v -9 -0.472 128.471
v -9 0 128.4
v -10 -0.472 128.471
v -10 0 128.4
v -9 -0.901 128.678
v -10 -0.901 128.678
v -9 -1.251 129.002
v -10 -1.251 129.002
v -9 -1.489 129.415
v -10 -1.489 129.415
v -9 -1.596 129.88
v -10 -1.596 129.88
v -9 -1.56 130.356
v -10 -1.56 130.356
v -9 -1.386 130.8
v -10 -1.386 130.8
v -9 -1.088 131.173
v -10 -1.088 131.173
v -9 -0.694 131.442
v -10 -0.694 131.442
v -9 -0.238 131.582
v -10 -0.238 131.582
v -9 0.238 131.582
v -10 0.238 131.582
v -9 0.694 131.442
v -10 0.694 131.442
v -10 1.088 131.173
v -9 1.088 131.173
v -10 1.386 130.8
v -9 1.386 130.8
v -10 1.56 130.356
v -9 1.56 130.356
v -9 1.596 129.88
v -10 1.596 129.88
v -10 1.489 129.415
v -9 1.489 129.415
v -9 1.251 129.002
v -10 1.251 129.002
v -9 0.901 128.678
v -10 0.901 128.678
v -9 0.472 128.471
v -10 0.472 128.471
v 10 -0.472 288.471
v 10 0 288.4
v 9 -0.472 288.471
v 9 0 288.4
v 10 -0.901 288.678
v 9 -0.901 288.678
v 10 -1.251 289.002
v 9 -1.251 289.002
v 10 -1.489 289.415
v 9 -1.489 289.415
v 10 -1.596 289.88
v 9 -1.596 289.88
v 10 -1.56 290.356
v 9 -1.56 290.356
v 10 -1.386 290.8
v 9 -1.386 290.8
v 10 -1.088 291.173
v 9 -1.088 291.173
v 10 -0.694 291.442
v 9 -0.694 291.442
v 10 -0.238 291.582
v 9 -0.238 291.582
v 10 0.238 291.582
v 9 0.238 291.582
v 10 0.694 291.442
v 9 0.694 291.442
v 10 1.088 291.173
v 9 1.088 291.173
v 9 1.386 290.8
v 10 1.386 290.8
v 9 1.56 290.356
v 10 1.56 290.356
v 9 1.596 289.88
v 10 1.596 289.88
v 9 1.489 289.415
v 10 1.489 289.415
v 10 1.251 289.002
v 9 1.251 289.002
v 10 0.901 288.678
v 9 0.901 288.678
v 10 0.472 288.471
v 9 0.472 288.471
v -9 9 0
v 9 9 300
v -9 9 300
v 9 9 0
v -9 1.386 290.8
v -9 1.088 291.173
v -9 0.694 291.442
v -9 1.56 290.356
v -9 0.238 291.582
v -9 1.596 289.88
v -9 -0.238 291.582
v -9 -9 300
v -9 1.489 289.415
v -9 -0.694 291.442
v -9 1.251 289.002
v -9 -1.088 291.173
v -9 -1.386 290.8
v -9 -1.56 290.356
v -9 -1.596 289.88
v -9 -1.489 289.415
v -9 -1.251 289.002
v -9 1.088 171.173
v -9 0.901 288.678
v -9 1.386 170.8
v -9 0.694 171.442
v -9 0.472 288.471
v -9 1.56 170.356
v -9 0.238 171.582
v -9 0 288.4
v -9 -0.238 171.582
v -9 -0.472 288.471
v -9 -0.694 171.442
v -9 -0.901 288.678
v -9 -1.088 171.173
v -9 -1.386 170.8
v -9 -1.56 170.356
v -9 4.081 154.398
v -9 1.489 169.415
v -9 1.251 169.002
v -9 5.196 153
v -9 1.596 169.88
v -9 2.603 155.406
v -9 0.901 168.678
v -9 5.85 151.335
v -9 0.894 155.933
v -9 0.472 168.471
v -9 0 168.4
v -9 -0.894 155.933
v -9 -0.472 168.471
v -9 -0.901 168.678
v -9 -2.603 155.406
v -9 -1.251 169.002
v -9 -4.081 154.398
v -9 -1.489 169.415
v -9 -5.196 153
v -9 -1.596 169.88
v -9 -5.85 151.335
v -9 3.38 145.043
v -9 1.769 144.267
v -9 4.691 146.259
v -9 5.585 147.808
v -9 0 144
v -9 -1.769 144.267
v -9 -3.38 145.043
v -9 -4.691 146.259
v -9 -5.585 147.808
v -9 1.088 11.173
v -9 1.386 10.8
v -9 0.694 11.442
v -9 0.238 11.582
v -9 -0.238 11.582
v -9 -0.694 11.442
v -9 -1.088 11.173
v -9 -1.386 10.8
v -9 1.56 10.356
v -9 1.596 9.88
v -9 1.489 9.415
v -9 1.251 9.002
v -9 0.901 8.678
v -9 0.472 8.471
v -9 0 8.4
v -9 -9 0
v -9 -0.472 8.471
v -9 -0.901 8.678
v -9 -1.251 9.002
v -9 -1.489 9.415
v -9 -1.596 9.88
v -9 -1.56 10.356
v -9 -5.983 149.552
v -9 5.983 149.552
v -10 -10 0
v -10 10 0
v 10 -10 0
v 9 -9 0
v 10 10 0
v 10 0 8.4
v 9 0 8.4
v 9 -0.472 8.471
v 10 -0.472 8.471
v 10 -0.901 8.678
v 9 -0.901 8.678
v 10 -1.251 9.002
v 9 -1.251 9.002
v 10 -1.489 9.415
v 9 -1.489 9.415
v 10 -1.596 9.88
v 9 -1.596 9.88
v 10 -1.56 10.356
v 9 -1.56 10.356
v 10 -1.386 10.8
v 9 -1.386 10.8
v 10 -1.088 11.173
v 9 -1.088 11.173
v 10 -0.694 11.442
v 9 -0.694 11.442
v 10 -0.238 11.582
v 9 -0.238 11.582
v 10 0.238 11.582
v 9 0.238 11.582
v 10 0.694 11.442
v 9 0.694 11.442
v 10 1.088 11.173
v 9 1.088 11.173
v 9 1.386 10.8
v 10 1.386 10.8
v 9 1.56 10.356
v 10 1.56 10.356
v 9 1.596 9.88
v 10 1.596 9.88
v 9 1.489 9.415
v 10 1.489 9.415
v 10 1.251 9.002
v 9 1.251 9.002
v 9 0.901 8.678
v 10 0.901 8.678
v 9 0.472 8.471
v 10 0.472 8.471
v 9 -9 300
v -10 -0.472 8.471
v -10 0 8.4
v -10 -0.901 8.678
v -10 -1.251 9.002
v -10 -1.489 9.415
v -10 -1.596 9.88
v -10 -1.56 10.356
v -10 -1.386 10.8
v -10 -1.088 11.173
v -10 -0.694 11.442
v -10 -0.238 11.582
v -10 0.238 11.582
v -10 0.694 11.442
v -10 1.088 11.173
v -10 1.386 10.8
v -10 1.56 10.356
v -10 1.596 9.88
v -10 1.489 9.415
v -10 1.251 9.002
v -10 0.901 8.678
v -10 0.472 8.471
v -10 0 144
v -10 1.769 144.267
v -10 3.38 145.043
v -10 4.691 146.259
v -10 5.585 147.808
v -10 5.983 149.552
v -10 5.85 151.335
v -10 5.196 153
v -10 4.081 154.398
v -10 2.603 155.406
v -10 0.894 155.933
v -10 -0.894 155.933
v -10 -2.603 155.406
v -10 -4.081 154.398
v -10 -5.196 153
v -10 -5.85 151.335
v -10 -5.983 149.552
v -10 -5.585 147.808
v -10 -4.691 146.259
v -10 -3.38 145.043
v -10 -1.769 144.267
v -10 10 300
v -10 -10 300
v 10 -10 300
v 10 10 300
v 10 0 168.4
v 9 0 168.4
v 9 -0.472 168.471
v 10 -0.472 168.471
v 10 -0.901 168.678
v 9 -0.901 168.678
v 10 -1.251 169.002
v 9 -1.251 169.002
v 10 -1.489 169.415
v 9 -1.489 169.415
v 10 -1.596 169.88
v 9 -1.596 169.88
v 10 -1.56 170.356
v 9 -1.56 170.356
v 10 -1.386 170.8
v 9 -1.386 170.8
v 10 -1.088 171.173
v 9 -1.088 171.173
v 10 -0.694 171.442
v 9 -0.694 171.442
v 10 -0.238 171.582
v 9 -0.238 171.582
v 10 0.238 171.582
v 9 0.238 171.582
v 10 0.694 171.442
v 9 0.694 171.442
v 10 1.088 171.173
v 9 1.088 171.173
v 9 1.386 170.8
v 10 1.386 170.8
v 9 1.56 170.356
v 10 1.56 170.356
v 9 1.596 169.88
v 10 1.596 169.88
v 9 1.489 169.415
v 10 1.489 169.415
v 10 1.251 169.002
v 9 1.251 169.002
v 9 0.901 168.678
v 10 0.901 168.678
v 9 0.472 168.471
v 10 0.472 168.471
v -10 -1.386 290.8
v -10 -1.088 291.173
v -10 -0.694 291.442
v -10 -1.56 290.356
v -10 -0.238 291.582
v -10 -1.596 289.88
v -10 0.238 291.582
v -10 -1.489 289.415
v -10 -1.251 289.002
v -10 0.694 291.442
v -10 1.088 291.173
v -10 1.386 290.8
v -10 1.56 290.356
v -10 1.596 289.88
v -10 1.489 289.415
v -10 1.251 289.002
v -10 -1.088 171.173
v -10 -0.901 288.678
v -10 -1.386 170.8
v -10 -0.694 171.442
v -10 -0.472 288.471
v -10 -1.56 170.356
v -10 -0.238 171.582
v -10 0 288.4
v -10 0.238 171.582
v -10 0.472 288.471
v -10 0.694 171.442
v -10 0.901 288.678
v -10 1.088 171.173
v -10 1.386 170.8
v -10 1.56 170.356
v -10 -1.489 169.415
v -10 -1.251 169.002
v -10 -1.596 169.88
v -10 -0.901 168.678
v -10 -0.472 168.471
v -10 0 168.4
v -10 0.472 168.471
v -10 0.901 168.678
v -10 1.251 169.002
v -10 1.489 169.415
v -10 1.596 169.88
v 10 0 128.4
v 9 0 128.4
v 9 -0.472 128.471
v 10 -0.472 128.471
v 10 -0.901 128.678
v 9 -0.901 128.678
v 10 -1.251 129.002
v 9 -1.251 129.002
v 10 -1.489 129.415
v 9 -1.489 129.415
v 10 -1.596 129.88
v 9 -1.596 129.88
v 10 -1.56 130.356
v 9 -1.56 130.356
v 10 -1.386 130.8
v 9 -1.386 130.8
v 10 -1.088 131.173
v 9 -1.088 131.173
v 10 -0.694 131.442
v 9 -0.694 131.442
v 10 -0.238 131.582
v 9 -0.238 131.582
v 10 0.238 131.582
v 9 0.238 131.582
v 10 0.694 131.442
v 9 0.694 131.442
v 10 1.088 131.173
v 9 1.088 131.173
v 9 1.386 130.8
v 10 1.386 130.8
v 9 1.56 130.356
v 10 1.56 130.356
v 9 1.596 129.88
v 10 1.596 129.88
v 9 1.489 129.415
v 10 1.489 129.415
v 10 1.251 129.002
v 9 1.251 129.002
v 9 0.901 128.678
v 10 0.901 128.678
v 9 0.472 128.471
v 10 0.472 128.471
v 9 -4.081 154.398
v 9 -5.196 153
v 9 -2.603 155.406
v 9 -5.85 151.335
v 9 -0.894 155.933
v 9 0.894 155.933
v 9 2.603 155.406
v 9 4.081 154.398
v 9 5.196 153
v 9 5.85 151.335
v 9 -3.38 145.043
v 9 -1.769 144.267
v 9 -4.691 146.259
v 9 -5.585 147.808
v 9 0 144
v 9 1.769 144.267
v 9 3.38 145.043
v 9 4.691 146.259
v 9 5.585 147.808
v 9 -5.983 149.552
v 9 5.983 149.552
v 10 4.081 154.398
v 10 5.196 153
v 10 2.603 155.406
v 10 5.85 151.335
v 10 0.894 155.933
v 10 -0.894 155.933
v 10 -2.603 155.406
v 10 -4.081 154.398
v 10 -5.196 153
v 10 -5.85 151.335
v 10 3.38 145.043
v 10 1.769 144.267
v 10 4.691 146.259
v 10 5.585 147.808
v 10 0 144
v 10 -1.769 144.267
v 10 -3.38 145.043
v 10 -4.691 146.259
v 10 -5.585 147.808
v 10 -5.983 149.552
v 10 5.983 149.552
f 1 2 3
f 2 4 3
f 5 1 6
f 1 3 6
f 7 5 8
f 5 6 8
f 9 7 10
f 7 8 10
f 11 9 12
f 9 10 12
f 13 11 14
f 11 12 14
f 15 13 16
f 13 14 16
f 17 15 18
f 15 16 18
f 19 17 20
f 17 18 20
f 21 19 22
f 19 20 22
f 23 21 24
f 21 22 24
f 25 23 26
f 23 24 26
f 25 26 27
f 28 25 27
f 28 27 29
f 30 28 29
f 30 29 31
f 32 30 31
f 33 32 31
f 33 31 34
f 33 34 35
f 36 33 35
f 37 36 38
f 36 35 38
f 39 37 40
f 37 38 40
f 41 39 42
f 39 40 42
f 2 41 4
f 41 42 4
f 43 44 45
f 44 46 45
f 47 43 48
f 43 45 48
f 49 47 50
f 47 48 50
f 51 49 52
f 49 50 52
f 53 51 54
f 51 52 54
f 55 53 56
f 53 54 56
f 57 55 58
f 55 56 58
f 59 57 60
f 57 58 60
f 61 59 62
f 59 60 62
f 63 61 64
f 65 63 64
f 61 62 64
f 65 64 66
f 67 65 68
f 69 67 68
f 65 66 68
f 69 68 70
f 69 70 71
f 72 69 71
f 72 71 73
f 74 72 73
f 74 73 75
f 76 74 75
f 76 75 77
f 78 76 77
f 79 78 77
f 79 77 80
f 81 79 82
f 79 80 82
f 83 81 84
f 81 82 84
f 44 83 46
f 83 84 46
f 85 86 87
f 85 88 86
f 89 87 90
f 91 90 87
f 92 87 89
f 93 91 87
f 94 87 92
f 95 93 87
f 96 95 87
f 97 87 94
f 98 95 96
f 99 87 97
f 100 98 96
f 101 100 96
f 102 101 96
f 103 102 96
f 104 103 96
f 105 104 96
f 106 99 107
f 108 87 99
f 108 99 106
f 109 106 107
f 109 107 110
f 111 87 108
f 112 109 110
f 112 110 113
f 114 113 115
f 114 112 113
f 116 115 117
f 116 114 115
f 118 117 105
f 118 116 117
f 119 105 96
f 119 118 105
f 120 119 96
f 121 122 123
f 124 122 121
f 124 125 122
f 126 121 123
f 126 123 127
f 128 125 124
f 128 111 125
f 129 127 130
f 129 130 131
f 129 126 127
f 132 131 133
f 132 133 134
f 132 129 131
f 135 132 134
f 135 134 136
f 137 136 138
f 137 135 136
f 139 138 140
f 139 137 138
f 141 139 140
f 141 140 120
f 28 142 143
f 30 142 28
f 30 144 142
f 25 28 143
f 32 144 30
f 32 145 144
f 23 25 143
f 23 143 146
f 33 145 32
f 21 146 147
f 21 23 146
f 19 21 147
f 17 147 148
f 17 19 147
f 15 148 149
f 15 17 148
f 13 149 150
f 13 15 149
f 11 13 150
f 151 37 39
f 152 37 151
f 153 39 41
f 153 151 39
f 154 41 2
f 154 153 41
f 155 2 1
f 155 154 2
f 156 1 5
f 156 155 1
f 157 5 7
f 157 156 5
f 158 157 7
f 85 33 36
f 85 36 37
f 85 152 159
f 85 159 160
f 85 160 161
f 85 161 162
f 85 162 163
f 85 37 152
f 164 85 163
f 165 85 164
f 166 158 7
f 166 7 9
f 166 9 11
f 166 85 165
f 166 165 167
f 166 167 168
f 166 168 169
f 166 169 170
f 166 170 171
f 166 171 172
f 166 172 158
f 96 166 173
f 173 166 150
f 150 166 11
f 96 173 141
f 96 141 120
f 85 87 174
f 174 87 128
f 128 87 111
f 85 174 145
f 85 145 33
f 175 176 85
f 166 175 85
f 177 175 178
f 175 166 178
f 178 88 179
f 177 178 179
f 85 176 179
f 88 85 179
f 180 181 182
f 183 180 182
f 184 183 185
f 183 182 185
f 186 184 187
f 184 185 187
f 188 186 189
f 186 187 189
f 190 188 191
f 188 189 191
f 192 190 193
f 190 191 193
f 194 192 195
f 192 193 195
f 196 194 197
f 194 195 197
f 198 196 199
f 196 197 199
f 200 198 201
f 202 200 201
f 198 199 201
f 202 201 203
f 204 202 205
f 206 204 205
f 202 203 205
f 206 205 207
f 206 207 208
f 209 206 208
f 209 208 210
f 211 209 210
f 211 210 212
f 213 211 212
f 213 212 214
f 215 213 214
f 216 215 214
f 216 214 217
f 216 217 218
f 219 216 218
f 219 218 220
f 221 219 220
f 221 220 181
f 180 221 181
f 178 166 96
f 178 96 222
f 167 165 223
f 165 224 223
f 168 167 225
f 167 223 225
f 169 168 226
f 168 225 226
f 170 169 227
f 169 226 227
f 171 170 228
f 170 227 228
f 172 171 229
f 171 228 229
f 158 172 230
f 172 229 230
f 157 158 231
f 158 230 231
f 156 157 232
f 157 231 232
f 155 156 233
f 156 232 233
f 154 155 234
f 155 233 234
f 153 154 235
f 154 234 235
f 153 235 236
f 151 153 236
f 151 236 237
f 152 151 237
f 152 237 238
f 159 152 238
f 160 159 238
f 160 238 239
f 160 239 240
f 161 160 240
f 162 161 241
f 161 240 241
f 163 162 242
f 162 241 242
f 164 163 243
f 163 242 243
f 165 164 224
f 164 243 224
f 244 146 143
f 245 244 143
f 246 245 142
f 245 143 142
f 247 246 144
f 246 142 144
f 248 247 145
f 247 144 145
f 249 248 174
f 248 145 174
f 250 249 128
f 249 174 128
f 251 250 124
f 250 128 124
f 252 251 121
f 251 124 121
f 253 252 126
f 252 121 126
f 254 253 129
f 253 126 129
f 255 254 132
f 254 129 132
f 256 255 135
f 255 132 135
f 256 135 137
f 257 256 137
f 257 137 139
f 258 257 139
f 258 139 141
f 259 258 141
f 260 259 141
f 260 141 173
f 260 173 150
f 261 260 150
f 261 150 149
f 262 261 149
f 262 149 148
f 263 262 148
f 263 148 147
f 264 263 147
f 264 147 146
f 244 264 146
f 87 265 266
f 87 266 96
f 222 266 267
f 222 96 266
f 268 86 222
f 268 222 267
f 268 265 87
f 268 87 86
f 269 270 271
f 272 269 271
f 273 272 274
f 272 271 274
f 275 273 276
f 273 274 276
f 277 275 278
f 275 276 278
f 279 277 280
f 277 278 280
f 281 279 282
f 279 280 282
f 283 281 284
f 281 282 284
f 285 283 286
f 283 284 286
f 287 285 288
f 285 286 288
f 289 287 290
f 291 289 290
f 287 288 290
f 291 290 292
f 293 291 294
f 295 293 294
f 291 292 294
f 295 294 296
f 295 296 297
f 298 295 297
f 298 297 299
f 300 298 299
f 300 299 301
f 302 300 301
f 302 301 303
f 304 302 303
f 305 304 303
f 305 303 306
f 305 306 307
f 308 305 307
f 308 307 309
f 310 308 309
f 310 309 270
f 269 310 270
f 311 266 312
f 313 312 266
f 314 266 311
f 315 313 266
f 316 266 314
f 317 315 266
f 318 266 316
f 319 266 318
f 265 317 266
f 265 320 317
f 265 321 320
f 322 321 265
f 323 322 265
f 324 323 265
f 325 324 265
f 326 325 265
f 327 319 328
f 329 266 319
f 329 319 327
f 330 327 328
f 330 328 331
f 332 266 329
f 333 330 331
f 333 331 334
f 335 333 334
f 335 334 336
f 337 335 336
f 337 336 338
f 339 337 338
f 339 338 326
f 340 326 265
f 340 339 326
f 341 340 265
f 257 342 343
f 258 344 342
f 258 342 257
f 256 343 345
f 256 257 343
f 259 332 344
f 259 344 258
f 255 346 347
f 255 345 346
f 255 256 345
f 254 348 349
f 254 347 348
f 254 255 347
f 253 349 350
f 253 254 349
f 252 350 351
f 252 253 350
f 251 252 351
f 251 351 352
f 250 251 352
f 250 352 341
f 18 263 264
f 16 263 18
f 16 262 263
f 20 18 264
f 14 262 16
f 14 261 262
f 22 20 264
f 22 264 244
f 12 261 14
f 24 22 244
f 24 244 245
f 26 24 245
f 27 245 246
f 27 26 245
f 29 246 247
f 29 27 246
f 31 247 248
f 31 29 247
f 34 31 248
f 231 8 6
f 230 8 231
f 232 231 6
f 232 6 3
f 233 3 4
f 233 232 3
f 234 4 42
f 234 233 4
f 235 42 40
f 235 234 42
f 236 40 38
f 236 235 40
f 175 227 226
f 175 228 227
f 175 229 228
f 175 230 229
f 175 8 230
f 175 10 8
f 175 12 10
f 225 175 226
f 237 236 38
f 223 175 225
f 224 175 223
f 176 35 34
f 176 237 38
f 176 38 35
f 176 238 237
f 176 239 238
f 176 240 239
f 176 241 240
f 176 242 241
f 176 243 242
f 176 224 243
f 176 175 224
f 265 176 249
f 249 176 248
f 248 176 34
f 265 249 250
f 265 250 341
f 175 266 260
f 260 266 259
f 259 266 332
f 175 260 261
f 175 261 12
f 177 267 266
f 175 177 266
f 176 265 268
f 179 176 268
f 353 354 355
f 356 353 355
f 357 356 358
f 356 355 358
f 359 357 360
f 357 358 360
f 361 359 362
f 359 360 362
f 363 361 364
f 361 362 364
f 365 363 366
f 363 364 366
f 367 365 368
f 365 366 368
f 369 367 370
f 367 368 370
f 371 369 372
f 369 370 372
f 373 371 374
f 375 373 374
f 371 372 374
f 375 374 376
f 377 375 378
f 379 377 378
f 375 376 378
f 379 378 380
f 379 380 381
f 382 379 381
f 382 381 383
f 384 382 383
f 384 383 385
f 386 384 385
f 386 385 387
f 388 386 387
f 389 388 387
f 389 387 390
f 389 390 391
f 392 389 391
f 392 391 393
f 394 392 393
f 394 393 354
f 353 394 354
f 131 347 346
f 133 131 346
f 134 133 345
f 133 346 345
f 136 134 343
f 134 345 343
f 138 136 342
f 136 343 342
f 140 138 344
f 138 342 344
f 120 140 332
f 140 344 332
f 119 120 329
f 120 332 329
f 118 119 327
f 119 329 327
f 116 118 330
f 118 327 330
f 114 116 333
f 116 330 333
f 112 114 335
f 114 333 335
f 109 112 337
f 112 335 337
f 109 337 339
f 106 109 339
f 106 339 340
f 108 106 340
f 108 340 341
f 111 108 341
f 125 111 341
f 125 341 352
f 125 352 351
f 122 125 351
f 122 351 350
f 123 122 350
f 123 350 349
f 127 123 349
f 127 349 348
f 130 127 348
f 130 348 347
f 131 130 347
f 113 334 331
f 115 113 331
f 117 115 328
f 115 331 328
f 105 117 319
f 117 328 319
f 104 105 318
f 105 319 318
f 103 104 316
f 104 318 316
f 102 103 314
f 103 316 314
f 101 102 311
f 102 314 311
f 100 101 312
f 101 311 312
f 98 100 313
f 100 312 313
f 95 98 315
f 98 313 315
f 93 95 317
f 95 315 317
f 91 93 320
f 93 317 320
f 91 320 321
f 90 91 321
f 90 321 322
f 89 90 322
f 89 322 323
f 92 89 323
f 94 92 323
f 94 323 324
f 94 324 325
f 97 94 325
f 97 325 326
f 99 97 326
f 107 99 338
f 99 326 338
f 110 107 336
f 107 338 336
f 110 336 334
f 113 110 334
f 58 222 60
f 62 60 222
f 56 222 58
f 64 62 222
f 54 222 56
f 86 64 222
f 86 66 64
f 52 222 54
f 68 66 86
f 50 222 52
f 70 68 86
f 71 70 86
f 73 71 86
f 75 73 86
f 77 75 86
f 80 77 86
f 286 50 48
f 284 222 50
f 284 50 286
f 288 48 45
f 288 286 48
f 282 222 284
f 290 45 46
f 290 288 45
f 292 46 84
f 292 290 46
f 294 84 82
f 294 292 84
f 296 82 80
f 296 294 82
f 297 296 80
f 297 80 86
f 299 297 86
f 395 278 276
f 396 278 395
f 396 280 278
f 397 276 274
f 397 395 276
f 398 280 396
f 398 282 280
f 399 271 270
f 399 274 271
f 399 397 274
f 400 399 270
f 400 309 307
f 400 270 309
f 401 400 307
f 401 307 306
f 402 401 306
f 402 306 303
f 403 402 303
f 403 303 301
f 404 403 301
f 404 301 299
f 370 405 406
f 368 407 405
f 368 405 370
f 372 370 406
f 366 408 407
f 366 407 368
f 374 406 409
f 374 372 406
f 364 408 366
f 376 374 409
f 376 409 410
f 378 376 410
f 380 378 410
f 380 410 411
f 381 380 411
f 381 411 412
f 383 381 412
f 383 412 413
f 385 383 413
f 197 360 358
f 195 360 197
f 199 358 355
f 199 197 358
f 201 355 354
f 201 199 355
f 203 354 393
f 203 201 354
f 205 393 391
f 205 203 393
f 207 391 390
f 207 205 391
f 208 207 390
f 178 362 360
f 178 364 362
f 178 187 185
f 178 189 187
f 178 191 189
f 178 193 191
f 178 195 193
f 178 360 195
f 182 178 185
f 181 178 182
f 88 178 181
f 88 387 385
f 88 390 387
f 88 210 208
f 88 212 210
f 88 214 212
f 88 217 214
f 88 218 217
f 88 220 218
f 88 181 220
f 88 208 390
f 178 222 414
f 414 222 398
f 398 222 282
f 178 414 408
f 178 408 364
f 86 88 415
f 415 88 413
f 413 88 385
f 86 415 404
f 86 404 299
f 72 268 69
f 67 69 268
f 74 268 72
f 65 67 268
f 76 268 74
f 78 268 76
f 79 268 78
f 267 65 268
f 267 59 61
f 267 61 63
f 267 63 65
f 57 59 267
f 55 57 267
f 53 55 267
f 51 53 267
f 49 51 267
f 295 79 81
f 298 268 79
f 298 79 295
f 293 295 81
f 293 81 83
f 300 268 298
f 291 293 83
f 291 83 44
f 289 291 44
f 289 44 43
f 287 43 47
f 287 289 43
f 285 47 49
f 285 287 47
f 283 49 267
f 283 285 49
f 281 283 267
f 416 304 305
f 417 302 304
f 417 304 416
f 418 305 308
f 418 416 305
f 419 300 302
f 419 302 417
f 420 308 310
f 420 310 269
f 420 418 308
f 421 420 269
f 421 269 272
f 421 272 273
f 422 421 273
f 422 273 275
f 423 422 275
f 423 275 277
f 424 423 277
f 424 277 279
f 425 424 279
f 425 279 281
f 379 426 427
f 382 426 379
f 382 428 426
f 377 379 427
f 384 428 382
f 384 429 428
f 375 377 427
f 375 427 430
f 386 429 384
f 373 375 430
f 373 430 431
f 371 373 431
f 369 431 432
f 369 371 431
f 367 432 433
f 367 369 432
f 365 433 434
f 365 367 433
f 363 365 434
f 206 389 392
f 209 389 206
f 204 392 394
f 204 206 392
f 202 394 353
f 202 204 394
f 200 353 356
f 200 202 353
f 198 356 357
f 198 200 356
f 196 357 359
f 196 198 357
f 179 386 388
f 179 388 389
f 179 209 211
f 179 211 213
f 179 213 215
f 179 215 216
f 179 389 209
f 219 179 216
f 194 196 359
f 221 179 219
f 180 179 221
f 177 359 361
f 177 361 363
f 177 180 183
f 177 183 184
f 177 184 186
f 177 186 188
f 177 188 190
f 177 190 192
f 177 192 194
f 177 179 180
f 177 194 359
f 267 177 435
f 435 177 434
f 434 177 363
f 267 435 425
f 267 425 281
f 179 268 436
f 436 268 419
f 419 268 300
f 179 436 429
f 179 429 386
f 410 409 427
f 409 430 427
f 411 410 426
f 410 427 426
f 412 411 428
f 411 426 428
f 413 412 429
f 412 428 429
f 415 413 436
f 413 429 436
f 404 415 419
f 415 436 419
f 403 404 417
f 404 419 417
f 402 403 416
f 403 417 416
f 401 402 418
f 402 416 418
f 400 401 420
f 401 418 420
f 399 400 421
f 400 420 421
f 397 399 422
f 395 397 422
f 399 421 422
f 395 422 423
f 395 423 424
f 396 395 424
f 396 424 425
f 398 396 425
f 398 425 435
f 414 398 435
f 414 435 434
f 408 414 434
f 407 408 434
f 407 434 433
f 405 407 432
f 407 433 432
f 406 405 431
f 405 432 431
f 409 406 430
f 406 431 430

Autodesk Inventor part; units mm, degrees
ref_plane "YZ Plane" through (0, 0, 0) normal (1, 0, 0) x (0, 1, 0)
ref_plane "XZ Plane" through (0, 0, 0) normal (0, 1, 0) x (-1, 0, 0)
ref_plane "XY Plane" through (0, 0, 0) normal (0, 0, 1) x (1, 0, 0)
sketch "スケッチ1" plane through (0, 0, 0) normal (0, 0, 1) x (1, 0, 0)
  line L0 (10, -10) -> (-10, -10)
  line L1 (-10, -10) -> (-10, 10)
  line L2 (-10, 10) -> (10, 10)
  line L3 (10, 10) -> (10, -10)
  line L4 (10, -10) -> (-10, 10) construction
  line L5 (-10, -10) -> (10, 10) construction
  line L6 (9, 9) -> (-9, 9)
  line L7 (-9, 9) -> (-9, -9)
  line L8 (-9, -9) -> (9, -9)
  line L9 (9, -9) -> (9, 9)
  point P0 (0, 0)
  dimension "d0" = 20
  dimension "d1" = 20
  dimension "d2" = 1
extrude "押し出し1" add sketch "スケッチ1" along normal blind 300
sketch "スケッチ2" plane through (10, -10, 0) normal (1, 0, 0) x (0, 0, -1)
  line L0 (0, 10) -> (-300, 10)
  line L1 (-300, 0) -> (-300, 20) projected
  line L2 (0, 0) -> (0, 20) projected
  point P0 (-290, 10)
  point P1 (-10, 10)
  point P2 (-150, 10)
  point P3 (-170, 10)
  point P4 (-130, 10)
  dimension "d5" = 10
  dimension "d6" = 10
  dimension "d17" = 20
  dimension "d18" = 20
hole "穴1" at (10, 0, 290) at (10, 0, 10) at (10, 0, 170) at (10, 0, 130) direction (-1, 0, 0) diameter 3.2 end through all
sketch "スケッチ3" plane through (10, -10, 0) normal (1, 0, 0) x (0, 0, -1)
  line L0 (0, 10) -> (-300, 10)
  line L1 (-300, 1) -> (-300, 19) projected
  circle A0 centre (-150, 10) radius 6
  dimension "d14" = 12
extrude "押し出し2" cut sketch "スケッチ3" against normal blind 300
properties part number "xx_shita"
